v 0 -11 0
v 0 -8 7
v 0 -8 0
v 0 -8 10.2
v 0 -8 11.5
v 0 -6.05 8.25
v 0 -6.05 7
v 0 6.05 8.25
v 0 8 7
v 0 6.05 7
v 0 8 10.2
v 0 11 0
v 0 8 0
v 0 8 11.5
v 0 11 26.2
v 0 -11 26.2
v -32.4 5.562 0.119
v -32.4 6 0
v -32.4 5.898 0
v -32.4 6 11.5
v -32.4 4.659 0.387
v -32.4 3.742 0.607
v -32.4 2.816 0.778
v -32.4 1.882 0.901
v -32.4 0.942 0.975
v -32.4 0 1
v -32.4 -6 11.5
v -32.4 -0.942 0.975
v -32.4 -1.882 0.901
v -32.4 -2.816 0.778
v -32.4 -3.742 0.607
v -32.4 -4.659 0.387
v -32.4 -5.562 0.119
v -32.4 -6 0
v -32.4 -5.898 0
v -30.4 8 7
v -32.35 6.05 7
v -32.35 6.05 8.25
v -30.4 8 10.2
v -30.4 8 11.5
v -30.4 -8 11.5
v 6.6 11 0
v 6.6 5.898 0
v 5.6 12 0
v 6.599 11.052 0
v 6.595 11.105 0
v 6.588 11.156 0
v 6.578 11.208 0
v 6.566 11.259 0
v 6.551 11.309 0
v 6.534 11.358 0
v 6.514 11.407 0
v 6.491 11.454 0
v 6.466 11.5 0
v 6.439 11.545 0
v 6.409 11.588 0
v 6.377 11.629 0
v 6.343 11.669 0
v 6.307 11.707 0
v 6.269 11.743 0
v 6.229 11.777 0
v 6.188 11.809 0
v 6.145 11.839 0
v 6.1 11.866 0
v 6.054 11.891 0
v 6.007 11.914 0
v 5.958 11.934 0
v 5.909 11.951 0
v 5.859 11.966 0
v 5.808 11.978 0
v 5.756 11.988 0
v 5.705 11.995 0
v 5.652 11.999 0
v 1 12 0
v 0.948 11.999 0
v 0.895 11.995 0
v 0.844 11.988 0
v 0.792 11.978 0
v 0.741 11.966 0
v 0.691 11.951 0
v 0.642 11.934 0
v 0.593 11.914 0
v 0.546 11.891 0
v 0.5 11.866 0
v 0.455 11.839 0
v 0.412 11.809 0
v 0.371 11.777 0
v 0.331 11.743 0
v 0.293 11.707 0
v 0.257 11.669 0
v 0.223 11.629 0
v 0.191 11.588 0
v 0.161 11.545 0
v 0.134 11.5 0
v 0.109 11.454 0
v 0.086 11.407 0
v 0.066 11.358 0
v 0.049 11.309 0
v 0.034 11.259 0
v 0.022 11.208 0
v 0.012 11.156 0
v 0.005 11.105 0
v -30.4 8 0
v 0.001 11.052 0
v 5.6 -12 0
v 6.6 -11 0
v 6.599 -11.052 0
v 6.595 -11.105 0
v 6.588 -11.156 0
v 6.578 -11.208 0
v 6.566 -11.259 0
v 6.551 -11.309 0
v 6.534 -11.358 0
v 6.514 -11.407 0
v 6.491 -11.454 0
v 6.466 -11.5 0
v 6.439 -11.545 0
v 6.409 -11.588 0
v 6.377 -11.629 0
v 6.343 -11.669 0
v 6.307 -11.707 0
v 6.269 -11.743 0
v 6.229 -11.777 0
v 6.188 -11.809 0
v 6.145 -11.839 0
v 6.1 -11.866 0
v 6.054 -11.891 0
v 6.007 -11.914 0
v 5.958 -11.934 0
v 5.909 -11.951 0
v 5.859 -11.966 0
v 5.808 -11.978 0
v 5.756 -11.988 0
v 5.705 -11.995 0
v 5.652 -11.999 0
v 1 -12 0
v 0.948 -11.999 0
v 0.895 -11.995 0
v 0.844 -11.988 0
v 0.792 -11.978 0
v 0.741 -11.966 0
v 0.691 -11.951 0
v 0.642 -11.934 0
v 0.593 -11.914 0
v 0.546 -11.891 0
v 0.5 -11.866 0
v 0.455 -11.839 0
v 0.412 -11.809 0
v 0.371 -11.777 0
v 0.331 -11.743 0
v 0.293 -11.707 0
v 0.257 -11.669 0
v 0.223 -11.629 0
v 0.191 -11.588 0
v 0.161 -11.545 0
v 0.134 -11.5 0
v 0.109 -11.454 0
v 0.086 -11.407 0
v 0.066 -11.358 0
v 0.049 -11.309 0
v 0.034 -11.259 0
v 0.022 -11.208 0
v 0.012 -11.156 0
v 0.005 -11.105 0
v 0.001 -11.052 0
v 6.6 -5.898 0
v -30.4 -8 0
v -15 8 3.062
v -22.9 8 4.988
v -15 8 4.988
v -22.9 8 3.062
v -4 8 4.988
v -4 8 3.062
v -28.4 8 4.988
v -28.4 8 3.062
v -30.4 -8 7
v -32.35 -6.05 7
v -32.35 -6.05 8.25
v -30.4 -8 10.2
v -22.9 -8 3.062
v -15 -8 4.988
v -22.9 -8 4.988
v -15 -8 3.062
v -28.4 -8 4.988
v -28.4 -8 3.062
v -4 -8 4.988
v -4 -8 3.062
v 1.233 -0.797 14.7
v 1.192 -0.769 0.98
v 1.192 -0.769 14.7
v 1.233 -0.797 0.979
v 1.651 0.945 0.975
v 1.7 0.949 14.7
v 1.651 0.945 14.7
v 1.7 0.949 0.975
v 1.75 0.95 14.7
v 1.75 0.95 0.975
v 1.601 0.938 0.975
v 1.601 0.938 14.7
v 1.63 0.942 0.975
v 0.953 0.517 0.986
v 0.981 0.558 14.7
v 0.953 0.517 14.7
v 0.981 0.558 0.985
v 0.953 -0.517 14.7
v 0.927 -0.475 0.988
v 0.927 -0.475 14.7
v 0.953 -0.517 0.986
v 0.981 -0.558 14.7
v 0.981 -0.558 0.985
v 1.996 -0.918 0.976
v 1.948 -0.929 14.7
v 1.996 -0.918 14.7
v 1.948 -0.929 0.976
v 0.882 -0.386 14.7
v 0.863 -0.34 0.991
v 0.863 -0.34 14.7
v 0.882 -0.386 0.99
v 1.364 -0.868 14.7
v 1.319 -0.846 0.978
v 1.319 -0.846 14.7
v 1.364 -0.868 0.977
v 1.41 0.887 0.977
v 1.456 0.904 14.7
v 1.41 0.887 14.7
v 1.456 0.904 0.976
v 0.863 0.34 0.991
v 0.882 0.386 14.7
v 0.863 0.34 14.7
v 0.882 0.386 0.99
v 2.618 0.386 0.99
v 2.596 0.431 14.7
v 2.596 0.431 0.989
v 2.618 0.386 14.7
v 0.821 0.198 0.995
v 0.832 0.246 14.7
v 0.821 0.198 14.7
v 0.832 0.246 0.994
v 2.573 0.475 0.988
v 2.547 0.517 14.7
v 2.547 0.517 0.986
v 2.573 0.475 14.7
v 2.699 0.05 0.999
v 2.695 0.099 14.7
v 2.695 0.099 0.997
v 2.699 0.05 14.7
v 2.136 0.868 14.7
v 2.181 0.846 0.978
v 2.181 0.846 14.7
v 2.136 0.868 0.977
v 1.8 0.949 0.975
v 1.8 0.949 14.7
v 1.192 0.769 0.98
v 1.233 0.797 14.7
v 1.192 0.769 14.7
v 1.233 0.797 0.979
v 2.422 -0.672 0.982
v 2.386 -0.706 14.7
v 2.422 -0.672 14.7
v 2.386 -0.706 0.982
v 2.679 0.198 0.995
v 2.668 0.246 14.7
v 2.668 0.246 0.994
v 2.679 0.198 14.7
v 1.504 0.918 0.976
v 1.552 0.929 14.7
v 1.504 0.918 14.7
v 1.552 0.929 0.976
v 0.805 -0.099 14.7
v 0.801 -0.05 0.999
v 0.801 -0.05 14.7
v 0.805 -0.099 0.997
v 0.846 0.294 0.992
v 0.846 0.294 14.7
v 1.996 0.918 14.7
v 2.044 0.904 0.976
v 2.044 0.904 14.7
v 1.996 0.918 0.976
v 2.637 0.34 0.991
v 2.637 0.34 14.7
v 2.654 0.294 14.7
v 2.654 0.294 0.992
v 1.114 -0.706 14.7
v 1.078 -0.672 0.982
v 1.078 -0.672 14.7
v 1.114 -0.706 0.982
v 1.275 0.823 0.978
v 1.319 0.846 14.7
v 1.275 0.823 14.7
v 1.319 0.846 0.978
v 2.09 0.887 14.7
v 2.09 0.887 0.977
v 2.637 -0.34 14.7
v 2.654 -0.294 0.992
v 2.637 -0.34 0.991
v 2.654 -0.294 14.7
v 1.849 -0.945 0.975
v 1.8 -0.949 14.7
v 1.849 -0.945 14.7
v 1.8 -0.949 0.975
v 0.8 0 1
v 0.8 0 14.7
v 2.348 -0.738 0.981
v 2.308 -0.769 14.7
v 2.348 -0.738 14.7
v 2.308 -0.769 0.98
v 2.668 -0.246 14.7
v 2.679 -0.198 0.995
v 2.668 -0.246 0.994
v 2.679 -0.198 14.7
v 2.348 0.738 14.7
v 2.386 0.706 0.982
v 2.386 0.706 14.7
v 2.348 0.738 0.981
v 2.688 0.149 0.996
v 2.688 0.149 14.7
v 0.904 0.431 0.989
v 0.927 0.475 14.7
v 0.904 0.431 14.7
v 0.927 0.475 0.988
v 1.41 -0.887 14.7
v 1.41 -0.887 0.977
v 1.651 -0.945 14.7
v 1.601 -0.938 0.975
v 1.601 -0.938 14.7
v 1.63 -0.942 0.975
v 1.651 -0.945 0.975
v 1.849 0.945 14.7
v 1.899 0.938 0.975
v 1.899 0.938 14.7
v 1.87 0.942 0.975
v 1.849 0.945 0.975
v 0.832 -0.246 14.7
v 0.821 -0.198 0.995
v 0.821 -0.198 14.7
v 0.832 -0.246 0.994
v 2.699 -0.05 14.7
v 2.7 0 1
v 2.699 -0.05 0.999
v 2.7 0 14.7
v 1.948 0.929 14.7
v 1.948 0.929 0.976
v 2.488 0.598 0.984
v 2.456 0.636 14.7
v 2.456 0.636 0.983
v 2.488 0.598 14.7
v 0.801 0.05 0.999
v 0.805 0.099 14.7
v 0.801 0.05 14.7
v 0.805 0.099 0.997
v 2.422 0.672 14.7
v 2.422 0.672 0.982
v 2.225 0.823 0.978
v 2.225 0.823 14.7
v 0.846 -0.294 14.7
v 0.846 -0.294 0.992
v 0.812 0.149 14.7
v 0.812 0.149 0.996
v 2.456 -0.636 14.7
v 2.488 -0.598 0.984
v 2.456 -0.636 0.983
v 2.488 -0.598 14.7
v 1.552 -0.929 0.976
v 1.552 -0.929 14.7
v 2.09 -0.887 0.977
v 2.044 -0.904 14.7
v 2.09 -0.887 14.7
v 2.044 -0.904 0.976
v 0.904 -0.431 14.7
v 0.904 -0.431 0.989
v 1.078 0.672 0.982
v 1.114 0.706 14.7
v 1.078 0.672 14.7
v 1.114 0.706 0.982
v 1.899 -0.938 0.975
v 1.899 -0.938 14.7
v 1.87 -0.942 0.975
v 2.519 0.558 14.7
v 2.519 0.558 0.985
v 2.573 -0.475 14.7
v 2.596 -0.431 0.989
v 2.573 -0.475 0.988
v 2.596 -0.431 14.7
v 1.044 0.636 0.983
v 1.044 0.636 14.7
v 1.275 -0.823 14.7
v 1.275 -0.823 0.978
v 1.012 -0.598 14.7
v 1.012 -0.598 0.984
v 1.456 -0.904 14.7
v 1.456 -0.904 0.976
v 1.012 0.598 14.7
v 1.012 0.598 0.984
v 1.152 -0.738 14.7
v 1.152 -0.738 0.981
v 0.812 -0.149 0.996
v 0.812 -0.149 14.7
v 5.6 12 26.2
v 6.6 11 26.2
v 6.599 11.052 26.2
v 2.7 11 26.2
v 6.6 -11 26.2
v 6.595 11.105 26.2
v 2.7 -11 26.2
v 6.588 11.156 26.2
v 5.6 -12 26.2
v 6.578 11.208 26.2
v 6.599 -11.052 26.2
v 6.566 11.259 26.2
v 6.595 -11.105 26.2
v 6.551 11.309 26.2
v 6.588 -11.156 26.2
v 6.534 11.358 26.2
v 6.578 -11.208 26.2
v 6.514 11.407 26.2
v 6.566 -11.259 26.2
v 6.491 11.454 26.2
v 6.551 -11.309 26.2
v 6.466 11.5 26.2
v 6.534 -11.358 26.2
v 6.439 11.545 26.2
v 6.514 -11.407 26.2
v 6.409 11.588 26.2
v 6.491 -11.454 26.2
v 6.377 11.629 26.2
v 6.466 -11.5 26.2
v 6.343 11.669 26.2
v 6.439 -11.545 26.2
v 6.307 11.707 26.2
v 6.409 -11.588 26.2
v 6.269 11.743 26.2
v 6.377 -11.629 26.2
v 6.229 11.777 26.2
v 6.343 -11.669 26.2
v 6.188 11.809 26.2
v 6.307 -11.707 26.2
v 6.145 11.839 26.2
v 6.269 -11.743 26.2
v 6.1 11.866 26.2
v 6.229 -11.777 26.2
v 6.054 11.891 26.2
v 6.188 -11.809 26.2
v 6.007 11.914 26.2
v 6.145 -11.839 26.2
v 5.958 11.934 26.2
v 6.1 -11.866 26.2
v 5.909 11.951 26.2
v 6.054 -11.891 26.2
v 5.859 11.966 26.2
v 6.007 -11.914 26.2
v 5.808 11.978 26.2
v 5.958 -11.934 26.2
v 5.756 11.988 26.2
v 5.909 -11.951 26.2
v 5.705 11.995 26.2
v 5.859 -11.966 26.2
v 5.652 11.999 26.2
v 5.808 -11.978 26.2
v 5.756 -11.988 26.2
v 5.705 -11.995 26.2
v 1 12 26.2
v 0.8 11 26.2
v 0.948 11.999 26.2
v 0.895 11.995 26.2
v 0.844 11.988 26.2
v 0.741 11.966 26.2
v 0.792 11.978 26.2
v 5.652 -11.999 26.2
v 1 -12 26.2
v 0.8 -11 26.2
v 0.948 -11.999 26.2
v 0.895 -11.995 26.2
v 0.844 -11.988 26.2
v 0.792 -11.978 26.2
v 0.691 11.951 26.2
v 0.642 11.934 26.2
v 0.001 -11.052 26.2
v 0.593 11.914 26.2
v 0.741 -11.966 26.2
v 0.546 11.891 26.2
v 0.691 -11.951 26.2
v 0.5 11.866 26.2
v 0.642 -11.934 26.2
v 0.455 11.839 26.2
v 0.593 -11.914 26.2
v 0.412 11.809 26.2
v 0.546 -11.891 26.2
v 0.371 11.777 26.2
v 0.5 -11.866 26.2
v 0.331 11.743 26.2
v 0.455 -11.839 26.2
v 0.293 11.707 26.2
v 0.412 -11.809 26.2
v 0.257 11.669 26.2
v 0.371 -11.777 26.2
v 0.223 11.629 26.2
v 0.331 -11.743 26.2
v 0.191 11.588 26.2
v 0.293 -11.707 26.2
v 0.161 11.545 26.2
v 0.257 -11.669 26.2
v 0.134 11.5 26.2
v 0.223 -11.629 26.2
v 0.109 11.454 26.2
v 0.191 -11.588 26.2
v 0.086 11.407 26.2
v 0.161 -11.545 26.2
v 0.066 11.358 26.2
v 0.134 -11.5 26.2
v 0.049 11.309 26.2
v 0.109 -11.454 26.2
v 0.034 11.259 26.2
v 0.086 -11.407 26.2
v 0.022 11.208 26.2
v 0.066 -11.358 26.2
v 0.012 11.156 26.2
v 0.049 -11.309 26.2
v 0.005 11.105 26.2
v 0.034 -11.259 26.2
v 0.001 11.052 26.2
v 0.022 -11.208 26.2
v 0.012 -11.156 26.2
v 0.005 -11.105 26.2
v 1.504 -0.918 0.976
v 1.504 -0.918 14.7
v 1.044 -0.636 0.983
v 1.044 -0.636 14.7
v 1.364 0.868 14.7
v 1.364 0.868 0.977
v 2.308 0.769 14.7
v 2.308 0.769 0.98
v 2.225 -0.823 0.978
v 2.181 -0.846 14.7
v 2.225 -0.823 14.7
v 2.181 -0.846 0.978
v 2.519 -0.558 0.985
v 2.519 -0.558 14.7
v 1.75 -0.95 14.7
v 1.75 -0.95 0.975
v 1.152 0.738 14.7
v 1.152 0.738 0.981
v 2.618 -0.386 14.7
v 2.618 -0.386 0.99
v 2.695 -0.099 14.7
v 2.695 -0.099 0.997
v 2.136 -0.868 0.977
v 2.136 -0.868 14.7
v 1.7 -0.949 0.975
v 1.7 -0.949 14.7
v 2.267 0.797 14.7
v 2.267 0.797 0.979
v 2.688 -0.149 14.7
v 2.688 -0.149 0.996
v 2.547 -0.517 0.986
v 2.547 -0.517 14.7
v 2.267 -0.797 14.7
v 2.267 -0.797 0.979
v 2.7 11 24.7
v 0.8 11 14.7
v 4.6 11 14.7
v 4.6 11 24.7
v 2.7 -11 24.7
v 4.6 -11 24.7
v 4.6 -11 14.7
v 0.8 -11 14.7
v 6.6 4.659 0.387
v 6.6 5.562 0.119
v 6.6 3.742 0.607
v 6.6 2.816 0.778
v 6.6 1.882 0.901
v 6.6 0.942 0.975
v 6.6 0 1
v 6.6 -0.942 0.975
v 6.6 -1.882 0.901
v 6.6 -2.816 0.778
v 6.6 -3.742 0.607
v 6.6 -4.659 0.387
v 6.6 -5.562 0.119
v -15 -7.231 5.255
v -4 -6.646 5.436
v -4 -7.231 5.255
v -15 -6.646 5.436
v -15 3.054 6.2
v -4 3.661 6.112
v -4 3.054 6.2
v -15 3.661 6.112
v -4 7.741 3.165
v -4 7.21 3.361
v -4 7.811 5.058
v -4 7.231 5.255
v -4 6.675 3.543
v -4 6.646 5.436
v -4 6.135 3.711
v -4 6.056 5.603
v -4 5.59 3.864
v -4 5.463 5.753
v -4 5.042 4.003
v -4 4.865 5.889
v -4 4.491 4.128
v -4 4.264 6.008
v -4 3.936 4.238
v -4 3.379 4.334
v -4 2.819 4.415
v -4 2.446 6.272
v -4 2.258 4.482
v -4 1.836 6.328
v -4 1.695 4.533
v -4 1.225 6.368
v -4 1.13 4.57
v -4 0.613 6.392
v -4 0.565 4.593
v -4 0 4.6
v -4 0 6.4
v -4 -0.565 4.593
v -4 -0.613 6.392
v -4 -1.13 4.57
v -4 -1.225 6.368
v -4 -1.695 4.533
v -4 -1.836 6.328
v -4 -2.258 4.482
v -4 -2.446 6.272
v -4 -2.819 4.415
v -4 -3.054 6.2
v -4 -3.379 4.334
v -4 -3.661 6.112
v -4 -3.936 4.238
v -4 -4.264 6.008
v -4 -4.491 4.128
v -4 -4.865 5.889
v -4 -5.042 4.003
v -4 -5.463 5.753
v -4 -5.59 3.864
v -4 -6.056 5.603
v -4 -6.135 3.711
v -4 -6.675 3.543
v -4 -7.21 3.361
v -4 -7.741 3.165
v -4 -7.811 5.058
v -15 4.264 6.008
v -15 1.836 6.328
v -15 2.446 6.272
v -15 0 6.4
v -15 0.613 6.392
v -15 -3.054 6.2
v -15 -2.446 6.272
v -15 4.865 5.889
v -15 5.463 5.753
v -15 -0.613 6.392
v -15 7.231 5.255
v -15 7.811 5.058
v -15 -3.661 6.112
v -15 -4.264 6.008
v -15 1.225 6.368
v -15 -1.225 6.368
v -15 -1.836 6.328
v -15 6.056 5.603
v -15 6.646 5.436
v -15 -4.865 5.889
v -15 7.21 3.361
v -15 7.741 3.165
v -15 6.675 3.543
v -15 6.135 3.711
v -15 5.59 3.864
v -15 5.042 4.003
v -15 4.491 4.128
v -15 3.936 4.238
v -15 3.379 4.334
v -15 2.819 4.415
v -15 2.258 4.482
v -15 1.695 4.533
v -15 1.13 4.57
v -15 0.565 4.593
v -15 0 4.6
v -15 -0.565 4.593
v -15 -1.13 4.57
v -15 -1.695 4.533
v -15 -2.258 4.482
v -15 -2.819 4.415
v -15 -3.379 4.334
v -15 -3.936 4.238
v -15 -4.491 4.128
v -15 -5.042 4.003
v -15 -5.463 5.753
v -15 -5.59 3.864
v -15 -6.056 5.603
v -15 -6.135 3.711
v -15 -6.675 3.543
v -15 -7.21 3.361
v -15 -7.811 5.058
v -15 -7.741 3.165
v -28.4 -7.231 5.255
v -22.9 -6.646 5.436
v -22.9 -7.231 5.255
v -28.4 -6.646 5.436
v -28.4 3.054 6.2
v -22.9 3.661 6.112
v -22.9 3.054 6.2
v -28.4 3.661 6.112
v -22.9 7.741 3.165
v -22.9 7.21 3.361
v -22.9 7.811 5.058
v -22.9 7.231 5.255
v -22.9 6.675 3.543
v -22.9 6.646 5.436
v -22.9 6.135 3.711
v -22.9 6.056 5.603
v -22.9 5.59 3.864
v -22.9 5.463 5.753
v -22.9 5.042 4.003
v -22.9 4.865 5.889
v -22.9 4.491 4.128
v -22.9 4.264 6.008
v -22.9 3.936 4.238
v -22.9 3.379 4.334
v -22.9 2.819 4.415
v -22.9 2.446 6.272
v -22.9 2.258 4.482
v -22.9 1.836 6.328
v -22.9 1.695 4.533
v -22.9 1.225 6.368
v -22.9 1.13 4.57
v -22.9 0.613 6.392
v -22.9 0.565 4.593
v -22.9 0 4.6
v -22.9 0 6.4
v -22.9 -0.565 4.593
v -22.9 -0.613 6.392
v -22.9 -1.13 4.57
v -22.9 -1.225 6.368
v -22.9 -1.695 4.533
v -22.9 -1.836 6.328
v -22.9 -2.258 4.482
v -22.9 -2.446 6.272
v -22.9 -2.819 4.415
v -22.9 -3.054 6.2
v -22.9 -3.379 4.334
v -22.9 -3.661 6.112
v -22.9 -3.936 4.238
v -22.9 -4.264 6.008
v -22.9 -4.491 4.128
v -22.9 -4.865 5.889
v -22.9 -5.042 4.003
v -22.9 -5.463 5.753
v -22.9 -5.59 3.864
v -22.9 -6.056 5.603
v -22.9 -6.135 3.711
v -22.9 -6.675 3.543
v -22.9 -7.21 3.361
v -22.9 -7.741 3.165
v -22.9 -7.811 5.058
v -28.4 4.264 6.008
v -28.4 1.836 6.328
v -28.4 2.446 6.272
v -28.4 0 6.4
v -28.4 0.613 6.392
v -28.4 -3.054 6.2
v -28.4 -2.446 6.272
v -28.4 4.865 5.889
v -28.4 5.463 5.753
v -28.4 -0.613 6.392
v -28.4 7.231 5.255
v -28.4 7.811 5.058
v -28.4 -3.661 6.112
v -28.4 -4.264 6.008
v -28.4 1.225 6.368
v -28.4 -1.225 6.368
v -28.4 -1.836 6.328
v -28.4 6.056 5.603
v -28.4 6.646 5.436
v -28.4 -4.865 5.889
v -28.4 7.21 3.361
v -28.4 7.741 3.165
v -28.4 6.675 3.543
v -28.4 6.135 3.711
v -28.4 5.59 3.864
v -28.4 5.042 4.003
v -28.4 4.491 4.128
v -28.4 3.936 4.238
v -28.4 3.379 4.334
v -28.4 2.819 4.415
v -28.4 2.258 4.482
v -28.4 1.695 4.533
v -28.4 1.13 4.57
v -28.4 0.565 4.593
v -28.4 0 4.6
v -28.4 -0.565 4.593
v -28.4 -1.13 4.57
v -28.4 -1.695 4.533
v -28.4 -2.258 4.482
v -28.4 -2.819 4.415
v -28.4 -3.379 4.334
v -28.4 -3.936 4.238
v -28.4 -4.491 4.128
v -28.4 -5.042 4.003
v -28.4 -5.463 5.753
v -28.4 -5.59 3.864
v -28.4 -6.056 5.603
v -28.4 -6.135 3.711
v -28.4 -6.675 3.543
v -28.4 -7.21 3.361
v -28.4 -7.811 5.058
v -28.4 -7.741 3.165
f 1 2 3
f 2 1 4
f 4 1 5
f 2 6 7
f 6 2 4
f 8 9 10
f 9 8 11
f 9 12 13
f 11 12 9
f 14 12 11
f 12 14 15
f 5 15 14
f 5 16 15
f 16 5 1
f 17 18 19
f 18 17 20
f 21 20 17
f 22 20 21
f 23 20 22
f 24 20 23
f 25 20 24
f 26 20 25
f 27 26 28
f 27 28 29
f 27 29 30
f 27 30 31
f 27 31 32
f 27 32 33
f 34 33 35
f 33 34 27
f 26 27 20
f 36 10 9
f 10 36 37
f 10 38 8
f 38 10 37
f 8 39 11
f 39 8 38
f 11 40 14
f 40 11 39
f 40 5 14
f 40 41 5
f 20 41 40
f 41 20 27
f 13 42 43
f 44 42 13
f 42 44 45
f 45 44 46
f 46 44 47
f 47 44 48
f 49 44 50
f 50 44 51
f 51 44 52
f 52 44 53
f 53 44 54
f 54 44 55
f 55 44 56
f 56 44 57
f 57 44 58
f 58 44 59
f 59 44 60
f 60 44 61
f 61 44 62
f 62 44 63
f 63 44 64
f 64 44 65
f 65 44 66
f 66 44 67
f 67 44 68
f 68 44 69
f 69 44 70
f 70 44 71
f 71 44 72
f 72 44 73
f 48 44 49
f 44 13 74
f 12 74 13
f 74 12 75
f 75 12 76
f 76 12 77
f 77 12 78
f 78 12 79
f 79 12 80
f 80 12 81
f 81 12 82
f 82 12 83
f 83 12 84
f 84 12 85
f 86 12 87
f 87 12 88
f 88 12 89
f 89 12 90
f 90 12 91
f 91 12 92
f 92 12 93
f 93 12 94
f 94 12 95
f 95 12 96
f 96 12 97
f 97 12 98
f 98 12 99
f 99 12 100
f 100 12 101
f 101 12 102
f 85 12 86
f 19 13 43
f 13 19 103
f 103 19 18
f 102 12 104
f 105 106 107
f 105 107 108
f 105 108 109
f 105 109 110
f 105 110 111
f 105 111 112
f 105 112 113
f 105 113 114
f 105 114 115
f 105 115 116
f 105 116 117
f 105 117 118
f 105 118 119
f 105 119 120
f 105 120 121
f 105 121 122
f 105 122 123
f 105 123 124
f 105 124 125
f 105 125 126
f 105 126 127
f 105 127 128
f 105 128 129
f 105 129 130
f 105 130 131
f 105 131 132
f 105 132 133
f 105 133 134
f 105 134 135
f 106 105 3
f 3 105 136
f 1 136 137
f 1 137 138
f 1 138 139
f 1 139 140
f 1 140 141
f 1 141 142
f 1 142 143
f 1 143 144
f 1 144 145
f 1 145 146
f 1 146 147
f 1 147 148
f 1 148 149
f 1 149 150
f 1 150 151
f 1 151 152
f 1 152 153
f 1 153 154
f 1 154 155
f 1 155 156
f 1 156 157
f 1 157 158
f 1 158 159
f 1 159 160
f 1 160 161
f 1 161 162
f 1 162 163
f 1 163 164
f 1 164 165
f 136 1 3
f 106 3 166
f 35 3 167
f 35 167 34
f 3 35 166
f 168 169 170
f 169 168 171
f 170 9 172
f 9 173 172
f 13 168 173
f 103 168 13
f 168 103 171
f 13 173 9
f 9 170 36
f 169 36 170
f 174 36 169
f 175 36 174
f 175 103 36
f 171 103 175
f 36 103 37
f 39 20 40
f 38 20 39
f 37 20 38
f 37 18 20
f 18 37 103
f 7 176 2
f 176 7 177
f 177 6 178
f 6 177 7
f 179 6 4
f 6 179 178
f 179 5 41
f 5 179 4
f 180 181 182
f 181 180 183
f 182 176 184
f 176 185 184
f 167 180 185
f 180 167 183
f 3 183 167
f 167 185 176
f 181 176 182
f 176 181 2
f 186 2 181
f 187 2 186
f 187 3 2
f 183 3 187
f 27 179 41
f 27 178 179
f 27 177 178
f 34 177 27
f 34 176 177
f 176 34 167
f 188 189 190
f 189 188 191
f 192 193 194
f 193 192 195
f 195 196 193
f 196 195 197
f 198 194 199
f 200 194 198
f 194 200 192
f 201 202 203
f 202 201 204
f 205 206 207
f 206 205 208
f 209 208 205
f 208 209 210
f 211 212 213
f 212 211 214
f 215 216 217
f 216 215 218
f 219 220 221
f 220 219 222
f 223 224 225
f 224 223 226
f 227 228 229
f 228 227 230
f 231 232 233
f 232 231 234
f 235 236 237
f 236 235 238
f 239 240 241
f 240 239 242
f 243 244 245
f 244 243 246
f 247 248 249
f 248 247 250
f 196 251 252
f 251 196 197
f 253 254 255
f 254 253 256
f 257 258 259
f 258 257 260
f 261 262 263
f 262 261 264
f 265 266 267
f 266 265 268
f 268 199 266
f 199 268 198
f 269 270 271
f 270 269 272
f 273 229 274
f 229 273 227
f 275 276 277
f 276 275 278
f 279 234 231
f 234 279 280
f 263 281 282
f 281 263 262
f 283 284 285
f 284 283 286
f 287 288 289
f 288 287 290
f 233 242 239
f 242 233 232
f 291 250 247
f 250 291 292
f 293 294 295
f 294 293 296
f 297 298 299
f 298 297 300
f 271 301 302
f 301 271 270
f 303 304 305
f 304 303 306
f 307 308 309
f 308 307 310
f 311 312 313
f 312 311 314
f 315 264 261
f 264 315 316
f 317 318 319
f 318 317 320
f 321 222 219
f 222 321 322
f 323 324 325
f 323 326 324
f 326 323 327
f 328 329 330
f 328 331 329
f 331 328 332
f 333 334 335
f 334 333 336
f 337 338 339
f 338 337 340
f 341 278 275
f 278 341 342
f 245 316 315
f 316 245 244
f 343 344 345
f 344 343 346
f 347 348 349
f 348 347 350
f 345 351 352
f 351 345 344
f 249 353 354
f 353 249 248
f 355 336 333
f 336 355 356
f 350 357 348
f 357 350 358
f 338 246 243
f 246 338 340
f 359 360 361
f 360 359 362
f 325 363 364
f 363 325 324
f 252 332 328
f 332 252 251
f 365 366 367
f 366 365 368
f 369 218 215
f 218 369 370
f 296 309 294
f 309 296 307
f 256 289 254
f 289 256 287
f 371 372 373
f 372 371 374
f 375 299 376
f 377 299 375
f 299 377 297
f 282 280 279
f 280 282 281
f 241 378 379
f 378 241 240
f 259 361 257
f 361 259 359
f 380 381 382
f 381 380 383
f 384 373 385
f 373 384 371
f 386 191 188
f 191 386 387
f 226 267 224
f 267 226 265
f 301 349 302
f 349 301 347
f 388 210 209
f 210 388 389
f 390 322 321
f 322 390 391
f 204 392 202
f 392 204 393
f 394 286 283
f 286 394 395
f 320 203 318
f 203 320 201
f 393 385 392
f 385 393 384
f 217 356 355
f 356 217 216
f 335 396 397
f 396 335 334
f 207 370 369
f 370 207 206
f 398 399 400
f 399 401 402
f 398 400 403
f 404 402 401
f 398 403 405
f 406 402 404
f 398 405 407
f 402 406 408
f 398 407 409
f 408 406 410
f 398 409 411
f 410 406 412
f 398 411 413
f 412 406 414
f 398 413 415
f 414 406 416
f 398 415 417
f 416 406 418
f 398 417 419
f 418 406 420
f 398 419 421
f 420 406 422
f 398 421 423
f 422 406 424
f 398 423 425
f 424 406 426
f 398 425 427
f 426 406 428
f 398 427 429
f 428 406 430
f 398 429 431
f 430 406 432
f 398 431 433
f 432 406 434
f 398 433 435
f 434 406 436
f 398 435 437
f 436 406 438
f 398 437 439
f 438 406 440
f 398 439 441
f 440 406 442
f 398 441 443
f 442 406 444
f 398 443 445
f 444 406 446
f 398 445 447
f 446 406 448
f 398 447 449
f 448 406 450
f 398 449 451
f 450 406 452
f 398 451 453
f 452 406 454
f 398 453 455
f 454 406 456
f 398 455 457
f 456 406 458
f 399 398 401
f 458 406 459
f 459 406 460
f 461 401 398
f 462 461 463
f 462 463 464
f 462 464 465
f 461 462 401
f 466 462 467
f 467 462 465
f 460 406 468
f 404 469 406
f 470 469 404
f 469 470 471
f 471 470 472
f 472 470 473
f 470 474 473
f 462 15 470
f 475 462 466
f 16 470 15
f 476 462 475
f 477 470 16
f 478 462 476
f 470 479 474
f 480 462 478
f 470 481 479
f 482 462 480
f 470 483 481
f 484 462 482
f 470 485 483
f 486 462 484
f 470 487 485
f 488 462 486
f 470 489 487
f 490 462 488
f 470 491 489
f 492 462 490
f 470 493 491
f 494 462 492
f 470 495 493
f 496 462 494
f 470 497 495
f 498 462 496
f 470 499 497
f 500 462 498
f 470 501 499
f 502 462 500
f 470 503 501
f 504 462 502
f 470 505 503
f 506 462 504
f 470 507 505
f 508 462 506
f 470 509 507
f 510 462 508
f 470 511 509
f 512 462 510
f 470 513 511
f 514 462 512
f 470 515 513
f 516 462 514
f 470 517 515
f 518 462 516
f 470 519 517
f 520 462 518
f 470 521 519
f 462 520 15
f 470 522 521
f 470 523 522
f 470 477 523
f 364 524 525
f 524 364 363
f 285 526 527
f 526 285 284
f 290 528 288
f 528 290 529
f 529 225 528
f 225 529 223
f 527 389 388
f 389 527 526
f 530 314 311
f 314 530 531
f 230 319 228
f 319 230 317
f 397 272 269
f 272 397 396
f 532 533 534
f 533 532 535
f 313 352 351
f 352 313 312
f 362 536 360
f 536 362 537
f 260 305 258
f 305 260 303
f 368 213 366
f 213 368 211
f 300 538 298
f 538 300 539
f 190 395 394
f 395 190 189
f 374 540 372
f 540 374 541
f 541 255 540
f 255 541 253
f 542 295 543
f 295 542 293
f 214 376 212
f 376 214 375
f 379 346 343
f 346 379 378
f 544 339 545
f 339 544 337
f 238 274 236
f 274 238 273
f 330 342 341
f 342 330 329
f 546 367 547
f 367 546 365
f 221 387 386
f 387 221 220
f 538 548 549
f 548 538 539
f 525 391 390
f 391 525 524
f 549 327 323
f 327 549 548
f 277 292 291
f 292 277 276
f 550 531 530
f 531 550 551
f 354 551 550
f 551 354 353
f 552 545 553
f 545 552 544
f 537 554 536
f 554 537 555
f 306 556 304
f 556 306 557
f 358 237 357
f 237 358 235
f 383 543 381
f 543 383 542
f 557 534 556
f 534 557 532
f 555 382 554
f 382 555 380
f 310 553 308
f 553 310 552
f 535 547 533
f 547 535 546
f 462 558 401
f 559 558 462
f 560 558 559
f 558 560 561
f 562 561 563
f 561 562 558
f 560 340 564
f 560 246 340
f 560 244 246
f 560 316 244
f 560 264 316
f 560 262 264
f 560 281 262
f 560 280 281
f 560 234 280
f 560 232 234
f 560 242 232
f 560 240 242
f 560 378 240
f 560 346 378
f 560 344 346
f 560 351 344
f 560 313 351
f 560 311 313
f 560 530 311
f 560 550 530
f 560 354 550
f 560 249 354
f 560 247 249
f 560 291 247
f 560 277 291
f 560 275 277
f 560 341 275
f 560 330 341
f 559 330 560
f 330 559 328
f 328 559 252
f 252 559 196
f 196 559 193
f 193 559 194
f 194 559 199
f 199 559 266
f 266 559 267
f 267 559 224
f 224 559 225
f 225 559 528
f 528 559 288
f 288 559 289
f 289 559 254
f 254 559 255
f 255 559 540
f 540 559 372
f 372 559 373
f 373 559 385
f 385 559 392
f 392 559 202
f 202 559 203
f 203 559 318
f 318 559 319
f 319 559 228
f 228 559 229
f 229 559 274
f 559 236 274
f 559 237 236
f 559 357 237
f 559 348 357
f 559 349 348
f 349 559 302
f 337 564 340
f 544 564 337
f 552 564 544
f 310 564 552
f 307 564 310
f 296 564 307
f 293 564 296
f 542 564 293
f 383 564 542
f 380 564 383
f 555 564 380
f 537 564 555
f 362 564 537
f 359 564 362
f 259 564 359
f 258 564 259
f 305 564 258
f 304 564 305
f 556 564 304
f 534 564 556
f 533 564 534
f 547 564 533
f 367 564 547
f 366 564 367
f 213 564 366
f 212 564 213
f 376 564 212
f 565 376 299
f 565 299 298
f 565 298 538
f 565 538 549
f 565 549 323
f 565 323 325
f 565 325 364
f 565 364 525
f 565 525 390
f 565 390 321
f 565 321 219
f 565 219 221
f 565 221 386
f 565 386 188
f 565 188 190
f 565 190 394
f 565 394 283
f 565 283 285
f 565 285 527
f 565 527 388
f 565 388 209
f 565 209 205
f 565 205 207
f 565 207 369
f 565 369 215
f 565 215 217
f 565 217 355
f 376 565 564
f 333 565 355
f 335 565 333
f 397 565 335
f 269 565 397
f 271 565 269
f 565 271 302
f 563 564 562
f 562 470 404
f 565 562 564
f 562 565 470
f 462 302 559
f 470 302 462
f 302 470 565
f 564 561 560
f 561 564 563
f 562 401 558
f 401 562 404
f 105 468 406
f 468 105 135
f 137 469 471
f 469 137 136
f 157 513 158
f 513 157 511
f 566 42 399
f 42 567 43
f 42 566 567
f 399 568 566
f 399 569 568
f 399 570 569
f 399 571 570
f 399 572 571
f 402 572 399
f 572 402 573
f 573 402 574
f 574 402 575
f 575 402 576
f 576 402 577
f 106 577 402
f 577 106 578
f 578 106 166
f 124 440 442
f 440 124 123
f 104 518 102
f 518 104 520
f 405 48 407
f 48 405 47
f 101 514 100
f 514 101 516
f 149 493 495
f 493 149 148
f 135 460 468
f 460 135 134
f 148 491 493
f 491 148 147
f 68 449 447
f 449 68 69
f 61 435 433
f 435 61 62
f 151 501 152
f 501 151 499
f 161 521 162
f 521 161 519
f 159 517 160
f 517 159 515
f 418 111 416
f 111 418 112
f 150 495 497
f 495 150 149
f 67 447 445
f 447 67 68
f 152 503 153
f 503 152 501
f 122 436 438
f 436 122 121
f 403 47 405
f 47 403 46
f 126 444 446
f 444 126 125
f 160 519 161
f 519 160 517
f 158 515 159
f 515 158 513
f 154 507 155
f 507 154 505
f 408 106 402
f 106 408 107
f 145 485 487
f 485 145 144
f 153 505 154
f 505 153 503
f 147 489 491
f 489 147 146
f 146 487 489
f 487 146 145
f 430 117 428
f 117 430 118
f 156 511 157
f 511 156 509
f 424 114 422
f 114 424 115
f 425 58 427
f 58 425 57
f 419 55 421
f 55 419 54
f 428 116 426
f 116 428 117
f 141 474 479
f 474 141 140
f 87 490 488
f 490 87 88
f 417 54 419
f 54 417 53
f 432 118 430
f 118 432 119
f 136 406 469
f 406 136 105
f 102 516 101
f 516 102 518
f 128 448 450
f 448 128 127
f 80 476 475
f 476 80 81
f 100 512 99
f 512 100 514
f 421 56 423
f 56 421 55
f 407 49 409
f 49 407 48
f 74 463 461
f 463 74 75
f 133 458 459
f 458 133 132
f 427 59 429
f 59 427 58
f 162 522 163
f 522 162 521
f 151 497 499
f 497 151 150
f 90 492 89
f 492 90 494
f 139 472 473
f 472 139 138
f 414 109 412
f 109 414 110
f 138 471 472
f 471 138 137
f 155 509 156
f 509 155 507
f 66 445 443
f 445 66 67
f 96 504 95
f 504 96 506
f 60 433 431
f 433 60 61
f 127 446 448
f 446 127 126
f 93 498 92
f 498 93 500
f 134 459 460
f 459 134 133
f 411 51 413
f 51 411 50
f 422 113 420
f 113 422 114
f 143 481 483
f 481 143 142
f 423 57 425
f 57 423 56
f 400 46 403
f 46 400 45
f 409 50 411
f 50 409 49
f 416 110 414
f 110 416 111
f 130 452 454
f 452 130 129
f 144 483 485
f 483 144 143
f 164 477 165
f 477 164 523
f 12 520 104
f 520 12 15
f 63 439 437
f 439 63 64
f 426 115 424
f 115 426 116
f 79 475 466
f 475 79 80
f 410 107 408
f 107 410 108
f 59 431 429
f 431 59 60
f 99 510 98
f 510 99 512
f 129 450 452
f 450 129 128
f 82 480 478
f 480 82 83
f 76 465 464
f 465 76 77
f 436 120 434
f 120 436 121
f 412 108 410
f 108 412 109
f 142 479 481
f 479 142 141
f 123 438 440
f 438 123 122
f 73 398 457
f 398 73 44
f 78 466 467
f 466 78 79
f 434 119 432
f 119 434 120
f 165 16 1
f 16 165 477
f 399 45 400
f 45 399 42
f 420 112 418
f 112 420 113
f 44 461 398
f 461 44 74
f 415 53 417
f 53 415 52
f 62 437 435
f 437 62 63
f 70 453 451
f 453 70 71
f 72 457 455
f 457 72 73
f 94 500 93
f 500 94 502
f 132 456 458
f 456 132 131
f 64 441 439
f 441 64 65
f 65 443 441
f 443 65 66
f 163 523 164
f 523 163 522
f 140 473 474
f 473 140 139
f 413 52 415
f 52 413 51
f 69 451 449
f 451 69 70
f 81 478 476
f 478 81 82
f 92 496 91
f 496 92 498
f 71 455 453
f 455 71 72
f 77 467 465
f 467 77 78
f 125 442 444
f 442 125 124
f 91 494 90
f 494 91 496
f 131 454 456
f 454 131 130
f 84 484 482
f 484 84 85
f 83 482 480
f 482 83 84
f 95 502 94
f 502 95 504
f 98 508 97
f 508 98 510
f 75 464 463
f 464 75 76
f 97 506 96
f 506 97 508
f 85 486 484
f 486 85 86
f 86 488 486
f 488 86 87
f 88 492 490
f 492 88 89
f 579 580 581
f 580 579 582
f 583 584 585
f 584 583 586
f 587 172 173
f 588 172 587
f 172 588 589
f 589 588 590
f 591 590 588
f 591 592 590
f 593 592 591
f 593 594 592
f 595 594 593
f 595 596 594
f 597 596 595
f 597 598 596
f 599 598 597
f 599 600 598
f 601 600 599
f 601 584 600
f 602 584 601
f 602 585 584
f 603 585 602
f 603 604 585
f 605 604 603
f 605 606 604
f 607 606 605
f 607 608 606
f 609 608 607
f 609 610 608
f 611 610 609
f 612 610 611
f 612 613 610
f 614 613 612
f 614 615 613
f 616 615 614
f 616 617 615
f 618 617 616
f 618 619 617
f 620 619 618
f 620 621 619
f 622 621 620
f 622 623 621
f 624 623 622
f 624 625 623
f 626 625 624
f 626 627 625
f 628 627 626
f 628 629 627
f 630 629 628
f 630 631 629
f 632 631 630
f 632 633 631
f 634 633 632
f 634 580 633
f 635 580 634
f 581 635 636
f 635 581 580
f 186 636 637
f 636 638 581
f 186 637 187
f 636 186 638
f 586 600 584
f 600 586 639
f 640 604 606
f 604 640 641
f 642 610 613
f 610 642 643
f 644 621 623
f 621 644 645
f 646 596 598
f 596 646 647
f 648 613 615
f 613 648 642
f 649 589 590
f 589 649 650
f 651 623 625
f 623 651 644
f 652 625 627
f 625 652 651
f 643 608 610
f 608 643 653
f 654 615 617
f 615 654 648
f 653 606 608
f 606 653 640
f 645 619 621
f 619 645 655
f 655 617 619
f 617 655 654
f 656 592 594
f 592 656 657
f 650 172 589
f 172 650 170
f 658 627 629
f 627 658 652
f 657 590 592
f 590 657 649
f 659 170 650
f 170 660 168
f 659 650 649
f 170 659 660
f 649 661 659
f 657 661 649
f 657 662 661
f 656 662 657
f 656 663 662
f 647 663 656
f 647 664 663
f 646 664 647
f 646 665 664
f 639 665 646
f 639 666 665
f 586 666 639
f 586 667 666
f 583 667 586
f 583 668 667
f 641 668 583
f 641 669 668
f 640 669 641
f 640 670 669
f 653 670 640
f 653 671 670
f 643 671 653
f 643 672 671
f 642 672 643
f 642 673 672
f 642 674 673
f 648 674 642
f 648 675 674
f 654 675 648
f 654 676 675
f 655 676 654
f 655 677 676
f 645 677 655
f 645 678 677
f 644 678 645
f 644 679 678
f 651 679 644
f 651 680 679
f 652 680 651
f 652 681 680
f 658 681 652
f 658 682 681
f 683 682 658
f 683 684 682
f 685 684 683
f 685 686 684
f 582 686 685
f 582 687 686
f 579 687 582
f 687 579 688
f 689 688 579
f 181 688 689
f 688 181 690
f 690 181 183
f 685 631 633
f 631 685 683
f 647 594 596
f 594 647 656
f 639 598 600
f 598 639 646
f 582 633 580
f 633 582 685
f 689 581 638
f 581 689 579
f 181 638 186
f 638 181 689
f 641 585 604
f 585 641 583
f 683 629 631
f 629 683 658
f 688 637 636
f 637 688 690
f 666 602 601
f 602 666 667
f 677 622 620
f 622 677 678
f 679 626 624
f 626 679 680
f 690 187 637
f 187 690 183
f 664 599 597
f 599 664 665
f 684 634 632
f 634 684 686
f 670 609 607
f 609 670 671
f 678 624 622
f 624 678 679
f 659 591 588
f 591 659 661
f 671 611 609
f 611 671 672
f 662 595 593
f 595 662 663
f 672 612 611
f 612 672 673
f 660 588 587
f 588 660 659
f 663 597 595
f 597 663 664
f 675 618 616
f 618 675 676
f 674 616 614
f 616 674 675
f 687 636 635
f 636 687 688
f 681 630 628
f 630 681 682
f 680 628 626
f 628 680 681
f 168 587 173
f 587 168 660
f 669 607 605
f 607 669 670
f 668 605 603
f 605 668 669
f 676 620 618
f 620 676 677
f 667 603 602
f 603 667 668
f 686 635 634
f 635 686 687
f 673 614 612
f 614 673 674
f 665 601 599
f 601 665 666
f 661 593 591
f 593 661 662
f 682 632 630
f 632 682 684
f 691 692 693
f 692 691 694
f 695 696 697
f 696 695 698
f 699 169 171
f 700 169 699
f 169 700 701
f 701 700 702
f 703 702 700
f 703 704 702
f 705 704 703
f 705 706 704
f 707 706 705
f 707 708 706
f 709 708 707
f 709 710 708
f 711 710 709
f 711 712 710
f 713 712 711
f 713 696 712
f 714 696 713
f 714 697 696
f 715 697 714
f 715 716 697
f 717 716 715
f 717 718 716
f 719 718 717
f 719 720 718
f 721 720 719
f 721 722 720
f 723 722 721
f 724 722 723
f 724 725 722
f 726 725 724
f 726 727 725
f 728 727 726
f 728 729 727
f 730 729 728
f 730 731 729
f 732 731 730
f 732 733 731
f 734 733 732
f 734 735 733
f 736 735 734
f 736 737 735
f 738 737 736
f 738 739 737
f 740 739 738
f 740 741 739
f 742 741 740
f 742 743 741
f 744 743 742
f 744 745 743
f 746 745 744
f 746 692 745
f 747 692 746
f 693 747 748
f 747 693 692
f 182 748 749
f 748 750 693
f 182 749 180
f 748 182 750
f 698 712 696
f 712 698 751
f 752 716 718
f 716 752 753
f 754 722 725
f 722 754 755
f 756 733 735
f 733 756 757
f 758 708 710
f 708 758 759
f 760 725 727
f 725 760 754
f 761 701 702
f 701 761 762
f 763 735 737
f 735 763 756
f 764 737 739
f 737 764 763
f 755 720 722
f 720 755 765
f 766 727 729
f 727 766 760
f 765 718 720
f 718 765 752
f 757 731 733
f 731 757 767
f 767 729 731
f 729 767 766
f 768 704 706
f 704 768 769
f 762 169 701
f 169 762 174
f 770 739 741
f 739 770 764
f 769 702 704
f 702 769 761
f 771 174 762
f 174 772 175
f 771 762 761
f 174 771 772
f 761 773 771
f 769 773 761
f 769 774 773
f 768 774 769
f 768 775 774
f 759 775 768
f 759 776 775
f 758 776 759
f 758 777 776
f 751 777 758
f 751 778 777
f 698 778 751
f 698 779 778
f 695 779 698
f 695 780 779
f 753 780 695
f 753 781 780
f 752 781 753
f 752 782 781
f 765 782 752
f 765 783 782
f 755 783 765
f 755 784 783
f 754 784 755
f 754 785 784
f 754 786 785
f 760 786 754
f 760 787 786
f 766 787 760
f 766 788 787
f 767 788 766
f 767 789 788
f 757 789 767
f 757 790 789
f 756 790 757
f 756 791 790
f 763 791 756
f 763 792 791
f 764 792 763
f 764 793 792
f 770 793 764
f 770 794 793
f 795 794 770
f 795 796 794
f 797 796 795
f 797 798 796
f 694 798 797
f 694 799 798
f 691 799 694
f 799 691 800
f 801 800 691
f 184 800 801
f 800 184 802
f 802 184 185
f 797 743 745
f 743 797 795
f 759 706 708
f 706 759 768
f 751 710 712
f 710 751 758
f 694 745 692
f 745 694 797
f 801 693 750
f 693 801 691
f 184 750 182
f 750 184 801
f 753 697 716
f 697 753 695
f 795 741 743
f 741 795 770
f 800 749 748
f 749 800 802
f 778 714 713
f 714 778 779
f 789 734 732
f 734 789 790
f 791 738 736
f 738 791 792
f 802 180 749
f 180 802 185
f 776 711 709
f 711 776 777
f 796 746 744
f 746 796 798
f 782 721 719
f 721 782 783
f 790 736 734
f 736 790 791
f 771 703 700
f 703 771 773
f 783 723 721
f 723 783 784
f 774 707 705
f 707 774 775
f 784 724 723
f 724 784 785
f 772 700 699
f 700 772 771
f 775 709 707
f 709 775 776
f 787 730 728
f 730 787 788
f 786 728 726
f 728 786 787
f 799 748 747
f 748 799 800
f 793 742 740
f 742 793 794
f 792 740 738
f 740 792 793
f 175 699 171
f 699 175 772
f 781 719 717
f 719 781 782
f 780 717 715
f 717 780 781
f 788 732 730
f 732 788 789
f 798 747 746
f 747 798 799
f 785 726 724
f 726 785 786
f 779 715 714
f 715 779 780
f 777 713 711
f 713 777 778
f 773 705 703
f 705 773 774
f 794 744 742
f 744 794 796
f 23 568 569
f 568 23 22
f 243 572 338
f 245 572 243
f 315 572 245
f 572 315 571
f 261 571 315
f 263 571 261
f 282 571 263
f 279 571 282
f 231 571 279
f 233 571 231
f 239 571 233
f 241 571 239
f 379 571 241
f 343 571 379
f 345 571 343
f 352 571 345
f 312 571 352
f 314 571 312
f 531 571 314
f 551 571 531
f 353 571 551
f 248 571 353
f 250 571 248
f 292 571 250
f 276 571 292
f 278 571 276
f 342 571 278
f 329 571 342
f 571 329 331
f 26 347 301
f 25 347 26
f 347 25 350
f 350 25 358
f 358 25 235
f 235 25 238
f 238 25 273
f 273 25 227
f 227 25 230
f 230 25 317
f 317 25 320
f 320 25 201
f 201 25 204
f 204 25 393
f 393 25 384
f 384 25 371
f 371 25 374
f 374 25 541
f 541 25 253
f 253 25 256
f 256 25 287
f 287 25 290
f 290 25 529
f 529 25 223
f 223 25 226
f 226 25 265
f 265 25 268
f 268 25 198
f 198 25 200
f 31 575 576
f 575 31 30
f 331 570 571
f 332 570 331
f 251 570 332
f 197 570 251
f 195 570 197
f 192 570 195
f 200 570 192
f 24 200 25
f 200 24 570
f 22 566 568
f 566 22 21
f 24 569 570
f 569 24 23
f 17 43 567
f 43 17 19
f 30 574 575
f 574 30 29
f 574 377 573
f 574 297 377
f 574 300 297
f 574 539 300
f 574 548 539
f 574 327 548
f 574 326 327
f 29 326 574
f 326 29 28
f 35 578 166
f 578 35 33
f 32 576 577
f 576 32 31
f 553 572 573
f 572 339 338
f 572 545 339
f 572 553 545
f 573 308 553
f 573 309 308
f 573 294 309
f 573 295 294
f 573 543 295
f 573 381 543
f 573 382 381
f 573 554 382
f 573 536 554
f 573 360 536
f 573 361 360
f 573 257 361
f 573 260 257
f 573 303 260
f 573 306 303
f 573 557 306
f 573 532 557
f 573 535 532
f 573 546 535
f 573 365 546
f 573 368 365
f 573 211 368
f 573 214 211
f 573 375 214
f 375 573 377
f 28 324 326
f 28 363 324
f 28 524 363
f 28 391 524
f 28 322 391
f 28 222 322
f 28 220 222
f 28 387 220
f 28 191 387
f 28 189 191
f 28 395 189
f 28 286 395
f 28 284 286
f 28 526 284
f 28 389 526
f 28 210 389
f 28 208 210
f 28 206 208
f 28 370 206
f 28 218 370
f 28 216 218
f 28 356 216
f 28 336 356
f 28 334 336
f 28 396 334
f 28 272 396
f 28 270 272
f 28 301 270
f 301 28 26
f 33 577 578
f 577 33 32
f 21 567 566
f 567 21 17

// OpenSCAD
// file: ../../lib/utils.scad
include <../variables.scad>

use <./Round-Anything/polyround.scad>


module mirrorCopy(v, mirrorOffset=0) {
  children();

  translate([v[0]*mirrorOffset, v[1]*mirrorOffset, v[2]*mirrorOffset])
  mirror(v)
  translate([-v[0]*mirrorOffset, -v[1]*mirrorOffset, -v[2]*mirrorOffset])
  children();
}

module mirrorRotate(r) {
  children();

  rotate(r)
  children();
}


module draft(vertical, offs) {
  hull() {
    translate([0, 0, vertical])linear_extrude(0.01)children();
    linear_extrude(0.01)offset(offs)children();
  }
}

module roundedCube(dimen, radii, center=false) {
  translate(center ? [-dimen.x/2, -dimen.y/2, -dimen.z/2] : [0, 0, 0])
  linear_extrude(dimen.z)
  polygon(polyRound([
    [0, 0, is_num(radii) ? radii : radii[0]],
    [dimen.x, 0, is_num(radii) ? radii : radii[1]],
    [dimen.x, dimen.y, is_num(radii) ? radii : radii[2]],
    [0, dimen.y, is_num(radii) ? radii : radii[3]],
  ], fn=$pfn));
}

module HeatsetInsertHole(bottom=false) {
  translate([0, 0, bottom ? 0 : -m3_insert_hole_depth]) {
    rotate_extrude()
    polygon([
      [0, 0],
      [0, m3_insert_hole_depth],
      [m3_insert_hole_diameter/2, m3_insert_hole_depth],
      [m3_insert_hole_diameter/2, m3_insert_cavity_depth+(m3_insert_cavity_diameter-m3_insert_hole_diameter)/2],
      [m3_insert_cavity_diameter/2, m3_insert_cavity_depth],
      [m3_insert_cavity_diameter/2, 0],
    ]);
  }
}

function roundedRectangle(width, height, radius) =
  polyRound([
    [width/2, height/2, radius],
    [-width/2, height/2, radius],
    [-width/2, -height/2, radius],
    [width/2, -height/2, radius],
  ], fn=$pfn);


module ChamferPyramid(l)       polyhedron(
  //        P0        P1        P2         P3       P4
  points= [[l,l,0], [l,-l,0], [-l,-l,0], [-l,l,0], [0,0,l]],
  faces=  [[0,1,4], [1,2,4],  [2,3,4],    [3,0,4], [1,0,3],  [2,1,3] ]
 );

/**
 * Produces a rail with a smaller plate to attach to, and a bigger base that
 * holds it in the opposite rail. The rail is centered on one of the long edges
 * of the plate that can be built upon, ranging wide in both x directions and
 * short into the positive y direction.
 */
module MountRail(clearance=MountRail_clearance) {
  translate([0, 0, -MountRail_total_height ])
  rotate([90, 0, 180])
  mirrorCopy([1, 0, 0])
  difference() {
    linear_extrude(MountRail_width,convexity=2)
    polygon([
      [0, 0],
      [MountRail_base_width/2-clearance, 0],
      [MountRail_base_width/2-clearance, MountRail_base_height-clearance],
      [MountRail_plate_width/2-clearance, MountRail_base_height+MountRail_chamfer_height-clearance],
      [MountRail_plate_width/2-clearance, MountRail_total_height],
      [0, MountRail_base_height+MountRail_chamfer_height+MountRail_plate_distance]
    ]);

    translate([MountRail_base_width/2, 0, MountRail_width/2])
    rotate([0, -90, 0])
    cylinder(d=m3_screw_diameter_loose, h=MountRail_pin_length);
  }
}

module ScrewHole(
  depth, // total depth, including head
  diameter,
  head_depth=0,
  head_diameter=0,
  elongation=0,
) {
  union () {
    // Screw head hole or slot
    if (head_depth > 0) {
      head_diameter_actual = head_diameter ? head_diameter  : diameter * 2;

      hull() {
        for(i=elongation ? [-1,1] : 0)
        translate([i*elongation/2, 0, -head_depth])
        cylinder(d=head_diameter_actual, h=head_depth);
      }
    }

    // Screw hole or slot
    hull() {
      for(i=elongation ? [-1,1] : 0)
      translate([i*elongation/2, 0, -depth])
      cylinder(d=diameter, h=depth);
    }
  }
}

module ScrewHoleM3(depth, head_depth=0, elongation=0) {
  ScrewHole(
    depth,
    diameter=m3_screw_diameter_loose,
    head_depth=head_depth,
    head_diameter=m3_screw_head_diameter,
    elongation=elongation
  );
}
// main file
include <../../variables.scad>

use <../../lib/Round-Anything/polyround.scad>
use <../../lib/utils.scad>

module HandlebarRailRail() {
  mirrorCopy([1, 0, 0])
  difference() {
    mirror([0, 1, 0])
    rotate([90, 0, 0])
    linear_extrude(HandlebarRail_rail_length, convexity=3)
    polygon([
      [0, 0],
      [8, 0],
      [8, 7],
      [8 - 1.95, HandlebarRail_rail_total_height - 1.25 - 1.95 - 1.3],
      [8 - 1.95, HandlebarRail_rail_total_height - 1.95 - 1.3],
      [8, HandlebarRail_rail_total_height - 1.3],
      [8, HandlebarRail_rail_total_height],
      [0, HandlebarRail_rail_total_height],
    ]);

    translate([8-2, HandlebarRail_rail_length, -2])
    rotate([0, 0, -45])
    translate([-1, 0, 0])
    cube([10, 10, 20]);
  }
}

module HandlebarRailStopblock() {
  difference() {
    hull() {
      for(i=[-1,1])for(j=[0,1])
      translate([i*(HandlebarRail_stopblock_width/2-HandlebarRail_stopblock_radius), j*(-HandlebarRail_stopblock_depth+2*HandlebarRail_stopblock_radius)-HandlebarRail_stopblock_radius, 0])
      cylinder(r=HandlebarRail_stopblock_radius, h=HandlebarRail_stopblock_height);
    }

    // cutout for magnets
    translate([0, -HandlebarRail_stopblock_magnet_wall_thickness, 0]) {
      // hole for pushing magnet out
      translate([0, -HandlebarRail_stopblock_magnet_thickness/2, 0])
      cylinder(d=HandlebarRail_stopblock_magnet_thickness, h=HandlebarRail_stopblock_height);

      translate([0, -HandlebarRail_stopblock_magnet_thickness, HandlebarRail_rail_total_height + HandlebarRail_stopblock_magnet_lift + HandlebarRail_stopblock_magnet_height / 2])
      cube([HandlebarRail_stopblock_magnet_width, HandlebarRail_stopblock_magnet_thickness * 2, HandlebarRail_stopblock_magnet_height], center=true);

      translate([0, -HandlebarRail_stopblock_magnet_thickness/2, HandlebarRail_stopblock_height-3])
      cube([HandlebarRail_stopblock_magnet_width, HandlebarRail_stopblock_magnet_thickness, 6], center=true);
    }
  }
}

module HandlebarRailZiptieCutout(width) {
  translate([0, width, 0])
  rotate([90, 0, 0])
  difference() {
    cylinder(r=HandlebarRail_tube_radius*1.3, h=width, $fn=$fn*2);
    cylinder(r=HandlebarRail_tube_radius*1.2, h=width, $fn=$fn*2);
  }
}

module HandlebarRail() {
  difference() {
    union() {
      HandlebarRailRail();
      HandlebarRailStopblock();
    }

    translate([0, 0, -HandlebarRail_tube_radius + HandlebarRail_tube_indent]) {
      union () {
        // tube
        translate([0, 50, 0])
        rotate([90, 0, 0])
        cylinder(r=HandlebarRail_tube_radius, h=100);

        // ziptie wide
        translate([0, 4, 0])
        HandlebarRailZiptieCutout(11);

        // ziptie small
        translate([0, HandlebarRail_rail_length - 4 - 5.5, 0])
        HandlebarRailZiptieCutout(5.5);
      }
    }
  }
}

if (orient_for_printing) {
  translate([0, 0, HandlebarRail_stopblock_depth])
  rotate([90, 0, 0])
  HandlebarRail();
} else {
  rotate([0, 0, 90])
  HandlebarRail();
}
